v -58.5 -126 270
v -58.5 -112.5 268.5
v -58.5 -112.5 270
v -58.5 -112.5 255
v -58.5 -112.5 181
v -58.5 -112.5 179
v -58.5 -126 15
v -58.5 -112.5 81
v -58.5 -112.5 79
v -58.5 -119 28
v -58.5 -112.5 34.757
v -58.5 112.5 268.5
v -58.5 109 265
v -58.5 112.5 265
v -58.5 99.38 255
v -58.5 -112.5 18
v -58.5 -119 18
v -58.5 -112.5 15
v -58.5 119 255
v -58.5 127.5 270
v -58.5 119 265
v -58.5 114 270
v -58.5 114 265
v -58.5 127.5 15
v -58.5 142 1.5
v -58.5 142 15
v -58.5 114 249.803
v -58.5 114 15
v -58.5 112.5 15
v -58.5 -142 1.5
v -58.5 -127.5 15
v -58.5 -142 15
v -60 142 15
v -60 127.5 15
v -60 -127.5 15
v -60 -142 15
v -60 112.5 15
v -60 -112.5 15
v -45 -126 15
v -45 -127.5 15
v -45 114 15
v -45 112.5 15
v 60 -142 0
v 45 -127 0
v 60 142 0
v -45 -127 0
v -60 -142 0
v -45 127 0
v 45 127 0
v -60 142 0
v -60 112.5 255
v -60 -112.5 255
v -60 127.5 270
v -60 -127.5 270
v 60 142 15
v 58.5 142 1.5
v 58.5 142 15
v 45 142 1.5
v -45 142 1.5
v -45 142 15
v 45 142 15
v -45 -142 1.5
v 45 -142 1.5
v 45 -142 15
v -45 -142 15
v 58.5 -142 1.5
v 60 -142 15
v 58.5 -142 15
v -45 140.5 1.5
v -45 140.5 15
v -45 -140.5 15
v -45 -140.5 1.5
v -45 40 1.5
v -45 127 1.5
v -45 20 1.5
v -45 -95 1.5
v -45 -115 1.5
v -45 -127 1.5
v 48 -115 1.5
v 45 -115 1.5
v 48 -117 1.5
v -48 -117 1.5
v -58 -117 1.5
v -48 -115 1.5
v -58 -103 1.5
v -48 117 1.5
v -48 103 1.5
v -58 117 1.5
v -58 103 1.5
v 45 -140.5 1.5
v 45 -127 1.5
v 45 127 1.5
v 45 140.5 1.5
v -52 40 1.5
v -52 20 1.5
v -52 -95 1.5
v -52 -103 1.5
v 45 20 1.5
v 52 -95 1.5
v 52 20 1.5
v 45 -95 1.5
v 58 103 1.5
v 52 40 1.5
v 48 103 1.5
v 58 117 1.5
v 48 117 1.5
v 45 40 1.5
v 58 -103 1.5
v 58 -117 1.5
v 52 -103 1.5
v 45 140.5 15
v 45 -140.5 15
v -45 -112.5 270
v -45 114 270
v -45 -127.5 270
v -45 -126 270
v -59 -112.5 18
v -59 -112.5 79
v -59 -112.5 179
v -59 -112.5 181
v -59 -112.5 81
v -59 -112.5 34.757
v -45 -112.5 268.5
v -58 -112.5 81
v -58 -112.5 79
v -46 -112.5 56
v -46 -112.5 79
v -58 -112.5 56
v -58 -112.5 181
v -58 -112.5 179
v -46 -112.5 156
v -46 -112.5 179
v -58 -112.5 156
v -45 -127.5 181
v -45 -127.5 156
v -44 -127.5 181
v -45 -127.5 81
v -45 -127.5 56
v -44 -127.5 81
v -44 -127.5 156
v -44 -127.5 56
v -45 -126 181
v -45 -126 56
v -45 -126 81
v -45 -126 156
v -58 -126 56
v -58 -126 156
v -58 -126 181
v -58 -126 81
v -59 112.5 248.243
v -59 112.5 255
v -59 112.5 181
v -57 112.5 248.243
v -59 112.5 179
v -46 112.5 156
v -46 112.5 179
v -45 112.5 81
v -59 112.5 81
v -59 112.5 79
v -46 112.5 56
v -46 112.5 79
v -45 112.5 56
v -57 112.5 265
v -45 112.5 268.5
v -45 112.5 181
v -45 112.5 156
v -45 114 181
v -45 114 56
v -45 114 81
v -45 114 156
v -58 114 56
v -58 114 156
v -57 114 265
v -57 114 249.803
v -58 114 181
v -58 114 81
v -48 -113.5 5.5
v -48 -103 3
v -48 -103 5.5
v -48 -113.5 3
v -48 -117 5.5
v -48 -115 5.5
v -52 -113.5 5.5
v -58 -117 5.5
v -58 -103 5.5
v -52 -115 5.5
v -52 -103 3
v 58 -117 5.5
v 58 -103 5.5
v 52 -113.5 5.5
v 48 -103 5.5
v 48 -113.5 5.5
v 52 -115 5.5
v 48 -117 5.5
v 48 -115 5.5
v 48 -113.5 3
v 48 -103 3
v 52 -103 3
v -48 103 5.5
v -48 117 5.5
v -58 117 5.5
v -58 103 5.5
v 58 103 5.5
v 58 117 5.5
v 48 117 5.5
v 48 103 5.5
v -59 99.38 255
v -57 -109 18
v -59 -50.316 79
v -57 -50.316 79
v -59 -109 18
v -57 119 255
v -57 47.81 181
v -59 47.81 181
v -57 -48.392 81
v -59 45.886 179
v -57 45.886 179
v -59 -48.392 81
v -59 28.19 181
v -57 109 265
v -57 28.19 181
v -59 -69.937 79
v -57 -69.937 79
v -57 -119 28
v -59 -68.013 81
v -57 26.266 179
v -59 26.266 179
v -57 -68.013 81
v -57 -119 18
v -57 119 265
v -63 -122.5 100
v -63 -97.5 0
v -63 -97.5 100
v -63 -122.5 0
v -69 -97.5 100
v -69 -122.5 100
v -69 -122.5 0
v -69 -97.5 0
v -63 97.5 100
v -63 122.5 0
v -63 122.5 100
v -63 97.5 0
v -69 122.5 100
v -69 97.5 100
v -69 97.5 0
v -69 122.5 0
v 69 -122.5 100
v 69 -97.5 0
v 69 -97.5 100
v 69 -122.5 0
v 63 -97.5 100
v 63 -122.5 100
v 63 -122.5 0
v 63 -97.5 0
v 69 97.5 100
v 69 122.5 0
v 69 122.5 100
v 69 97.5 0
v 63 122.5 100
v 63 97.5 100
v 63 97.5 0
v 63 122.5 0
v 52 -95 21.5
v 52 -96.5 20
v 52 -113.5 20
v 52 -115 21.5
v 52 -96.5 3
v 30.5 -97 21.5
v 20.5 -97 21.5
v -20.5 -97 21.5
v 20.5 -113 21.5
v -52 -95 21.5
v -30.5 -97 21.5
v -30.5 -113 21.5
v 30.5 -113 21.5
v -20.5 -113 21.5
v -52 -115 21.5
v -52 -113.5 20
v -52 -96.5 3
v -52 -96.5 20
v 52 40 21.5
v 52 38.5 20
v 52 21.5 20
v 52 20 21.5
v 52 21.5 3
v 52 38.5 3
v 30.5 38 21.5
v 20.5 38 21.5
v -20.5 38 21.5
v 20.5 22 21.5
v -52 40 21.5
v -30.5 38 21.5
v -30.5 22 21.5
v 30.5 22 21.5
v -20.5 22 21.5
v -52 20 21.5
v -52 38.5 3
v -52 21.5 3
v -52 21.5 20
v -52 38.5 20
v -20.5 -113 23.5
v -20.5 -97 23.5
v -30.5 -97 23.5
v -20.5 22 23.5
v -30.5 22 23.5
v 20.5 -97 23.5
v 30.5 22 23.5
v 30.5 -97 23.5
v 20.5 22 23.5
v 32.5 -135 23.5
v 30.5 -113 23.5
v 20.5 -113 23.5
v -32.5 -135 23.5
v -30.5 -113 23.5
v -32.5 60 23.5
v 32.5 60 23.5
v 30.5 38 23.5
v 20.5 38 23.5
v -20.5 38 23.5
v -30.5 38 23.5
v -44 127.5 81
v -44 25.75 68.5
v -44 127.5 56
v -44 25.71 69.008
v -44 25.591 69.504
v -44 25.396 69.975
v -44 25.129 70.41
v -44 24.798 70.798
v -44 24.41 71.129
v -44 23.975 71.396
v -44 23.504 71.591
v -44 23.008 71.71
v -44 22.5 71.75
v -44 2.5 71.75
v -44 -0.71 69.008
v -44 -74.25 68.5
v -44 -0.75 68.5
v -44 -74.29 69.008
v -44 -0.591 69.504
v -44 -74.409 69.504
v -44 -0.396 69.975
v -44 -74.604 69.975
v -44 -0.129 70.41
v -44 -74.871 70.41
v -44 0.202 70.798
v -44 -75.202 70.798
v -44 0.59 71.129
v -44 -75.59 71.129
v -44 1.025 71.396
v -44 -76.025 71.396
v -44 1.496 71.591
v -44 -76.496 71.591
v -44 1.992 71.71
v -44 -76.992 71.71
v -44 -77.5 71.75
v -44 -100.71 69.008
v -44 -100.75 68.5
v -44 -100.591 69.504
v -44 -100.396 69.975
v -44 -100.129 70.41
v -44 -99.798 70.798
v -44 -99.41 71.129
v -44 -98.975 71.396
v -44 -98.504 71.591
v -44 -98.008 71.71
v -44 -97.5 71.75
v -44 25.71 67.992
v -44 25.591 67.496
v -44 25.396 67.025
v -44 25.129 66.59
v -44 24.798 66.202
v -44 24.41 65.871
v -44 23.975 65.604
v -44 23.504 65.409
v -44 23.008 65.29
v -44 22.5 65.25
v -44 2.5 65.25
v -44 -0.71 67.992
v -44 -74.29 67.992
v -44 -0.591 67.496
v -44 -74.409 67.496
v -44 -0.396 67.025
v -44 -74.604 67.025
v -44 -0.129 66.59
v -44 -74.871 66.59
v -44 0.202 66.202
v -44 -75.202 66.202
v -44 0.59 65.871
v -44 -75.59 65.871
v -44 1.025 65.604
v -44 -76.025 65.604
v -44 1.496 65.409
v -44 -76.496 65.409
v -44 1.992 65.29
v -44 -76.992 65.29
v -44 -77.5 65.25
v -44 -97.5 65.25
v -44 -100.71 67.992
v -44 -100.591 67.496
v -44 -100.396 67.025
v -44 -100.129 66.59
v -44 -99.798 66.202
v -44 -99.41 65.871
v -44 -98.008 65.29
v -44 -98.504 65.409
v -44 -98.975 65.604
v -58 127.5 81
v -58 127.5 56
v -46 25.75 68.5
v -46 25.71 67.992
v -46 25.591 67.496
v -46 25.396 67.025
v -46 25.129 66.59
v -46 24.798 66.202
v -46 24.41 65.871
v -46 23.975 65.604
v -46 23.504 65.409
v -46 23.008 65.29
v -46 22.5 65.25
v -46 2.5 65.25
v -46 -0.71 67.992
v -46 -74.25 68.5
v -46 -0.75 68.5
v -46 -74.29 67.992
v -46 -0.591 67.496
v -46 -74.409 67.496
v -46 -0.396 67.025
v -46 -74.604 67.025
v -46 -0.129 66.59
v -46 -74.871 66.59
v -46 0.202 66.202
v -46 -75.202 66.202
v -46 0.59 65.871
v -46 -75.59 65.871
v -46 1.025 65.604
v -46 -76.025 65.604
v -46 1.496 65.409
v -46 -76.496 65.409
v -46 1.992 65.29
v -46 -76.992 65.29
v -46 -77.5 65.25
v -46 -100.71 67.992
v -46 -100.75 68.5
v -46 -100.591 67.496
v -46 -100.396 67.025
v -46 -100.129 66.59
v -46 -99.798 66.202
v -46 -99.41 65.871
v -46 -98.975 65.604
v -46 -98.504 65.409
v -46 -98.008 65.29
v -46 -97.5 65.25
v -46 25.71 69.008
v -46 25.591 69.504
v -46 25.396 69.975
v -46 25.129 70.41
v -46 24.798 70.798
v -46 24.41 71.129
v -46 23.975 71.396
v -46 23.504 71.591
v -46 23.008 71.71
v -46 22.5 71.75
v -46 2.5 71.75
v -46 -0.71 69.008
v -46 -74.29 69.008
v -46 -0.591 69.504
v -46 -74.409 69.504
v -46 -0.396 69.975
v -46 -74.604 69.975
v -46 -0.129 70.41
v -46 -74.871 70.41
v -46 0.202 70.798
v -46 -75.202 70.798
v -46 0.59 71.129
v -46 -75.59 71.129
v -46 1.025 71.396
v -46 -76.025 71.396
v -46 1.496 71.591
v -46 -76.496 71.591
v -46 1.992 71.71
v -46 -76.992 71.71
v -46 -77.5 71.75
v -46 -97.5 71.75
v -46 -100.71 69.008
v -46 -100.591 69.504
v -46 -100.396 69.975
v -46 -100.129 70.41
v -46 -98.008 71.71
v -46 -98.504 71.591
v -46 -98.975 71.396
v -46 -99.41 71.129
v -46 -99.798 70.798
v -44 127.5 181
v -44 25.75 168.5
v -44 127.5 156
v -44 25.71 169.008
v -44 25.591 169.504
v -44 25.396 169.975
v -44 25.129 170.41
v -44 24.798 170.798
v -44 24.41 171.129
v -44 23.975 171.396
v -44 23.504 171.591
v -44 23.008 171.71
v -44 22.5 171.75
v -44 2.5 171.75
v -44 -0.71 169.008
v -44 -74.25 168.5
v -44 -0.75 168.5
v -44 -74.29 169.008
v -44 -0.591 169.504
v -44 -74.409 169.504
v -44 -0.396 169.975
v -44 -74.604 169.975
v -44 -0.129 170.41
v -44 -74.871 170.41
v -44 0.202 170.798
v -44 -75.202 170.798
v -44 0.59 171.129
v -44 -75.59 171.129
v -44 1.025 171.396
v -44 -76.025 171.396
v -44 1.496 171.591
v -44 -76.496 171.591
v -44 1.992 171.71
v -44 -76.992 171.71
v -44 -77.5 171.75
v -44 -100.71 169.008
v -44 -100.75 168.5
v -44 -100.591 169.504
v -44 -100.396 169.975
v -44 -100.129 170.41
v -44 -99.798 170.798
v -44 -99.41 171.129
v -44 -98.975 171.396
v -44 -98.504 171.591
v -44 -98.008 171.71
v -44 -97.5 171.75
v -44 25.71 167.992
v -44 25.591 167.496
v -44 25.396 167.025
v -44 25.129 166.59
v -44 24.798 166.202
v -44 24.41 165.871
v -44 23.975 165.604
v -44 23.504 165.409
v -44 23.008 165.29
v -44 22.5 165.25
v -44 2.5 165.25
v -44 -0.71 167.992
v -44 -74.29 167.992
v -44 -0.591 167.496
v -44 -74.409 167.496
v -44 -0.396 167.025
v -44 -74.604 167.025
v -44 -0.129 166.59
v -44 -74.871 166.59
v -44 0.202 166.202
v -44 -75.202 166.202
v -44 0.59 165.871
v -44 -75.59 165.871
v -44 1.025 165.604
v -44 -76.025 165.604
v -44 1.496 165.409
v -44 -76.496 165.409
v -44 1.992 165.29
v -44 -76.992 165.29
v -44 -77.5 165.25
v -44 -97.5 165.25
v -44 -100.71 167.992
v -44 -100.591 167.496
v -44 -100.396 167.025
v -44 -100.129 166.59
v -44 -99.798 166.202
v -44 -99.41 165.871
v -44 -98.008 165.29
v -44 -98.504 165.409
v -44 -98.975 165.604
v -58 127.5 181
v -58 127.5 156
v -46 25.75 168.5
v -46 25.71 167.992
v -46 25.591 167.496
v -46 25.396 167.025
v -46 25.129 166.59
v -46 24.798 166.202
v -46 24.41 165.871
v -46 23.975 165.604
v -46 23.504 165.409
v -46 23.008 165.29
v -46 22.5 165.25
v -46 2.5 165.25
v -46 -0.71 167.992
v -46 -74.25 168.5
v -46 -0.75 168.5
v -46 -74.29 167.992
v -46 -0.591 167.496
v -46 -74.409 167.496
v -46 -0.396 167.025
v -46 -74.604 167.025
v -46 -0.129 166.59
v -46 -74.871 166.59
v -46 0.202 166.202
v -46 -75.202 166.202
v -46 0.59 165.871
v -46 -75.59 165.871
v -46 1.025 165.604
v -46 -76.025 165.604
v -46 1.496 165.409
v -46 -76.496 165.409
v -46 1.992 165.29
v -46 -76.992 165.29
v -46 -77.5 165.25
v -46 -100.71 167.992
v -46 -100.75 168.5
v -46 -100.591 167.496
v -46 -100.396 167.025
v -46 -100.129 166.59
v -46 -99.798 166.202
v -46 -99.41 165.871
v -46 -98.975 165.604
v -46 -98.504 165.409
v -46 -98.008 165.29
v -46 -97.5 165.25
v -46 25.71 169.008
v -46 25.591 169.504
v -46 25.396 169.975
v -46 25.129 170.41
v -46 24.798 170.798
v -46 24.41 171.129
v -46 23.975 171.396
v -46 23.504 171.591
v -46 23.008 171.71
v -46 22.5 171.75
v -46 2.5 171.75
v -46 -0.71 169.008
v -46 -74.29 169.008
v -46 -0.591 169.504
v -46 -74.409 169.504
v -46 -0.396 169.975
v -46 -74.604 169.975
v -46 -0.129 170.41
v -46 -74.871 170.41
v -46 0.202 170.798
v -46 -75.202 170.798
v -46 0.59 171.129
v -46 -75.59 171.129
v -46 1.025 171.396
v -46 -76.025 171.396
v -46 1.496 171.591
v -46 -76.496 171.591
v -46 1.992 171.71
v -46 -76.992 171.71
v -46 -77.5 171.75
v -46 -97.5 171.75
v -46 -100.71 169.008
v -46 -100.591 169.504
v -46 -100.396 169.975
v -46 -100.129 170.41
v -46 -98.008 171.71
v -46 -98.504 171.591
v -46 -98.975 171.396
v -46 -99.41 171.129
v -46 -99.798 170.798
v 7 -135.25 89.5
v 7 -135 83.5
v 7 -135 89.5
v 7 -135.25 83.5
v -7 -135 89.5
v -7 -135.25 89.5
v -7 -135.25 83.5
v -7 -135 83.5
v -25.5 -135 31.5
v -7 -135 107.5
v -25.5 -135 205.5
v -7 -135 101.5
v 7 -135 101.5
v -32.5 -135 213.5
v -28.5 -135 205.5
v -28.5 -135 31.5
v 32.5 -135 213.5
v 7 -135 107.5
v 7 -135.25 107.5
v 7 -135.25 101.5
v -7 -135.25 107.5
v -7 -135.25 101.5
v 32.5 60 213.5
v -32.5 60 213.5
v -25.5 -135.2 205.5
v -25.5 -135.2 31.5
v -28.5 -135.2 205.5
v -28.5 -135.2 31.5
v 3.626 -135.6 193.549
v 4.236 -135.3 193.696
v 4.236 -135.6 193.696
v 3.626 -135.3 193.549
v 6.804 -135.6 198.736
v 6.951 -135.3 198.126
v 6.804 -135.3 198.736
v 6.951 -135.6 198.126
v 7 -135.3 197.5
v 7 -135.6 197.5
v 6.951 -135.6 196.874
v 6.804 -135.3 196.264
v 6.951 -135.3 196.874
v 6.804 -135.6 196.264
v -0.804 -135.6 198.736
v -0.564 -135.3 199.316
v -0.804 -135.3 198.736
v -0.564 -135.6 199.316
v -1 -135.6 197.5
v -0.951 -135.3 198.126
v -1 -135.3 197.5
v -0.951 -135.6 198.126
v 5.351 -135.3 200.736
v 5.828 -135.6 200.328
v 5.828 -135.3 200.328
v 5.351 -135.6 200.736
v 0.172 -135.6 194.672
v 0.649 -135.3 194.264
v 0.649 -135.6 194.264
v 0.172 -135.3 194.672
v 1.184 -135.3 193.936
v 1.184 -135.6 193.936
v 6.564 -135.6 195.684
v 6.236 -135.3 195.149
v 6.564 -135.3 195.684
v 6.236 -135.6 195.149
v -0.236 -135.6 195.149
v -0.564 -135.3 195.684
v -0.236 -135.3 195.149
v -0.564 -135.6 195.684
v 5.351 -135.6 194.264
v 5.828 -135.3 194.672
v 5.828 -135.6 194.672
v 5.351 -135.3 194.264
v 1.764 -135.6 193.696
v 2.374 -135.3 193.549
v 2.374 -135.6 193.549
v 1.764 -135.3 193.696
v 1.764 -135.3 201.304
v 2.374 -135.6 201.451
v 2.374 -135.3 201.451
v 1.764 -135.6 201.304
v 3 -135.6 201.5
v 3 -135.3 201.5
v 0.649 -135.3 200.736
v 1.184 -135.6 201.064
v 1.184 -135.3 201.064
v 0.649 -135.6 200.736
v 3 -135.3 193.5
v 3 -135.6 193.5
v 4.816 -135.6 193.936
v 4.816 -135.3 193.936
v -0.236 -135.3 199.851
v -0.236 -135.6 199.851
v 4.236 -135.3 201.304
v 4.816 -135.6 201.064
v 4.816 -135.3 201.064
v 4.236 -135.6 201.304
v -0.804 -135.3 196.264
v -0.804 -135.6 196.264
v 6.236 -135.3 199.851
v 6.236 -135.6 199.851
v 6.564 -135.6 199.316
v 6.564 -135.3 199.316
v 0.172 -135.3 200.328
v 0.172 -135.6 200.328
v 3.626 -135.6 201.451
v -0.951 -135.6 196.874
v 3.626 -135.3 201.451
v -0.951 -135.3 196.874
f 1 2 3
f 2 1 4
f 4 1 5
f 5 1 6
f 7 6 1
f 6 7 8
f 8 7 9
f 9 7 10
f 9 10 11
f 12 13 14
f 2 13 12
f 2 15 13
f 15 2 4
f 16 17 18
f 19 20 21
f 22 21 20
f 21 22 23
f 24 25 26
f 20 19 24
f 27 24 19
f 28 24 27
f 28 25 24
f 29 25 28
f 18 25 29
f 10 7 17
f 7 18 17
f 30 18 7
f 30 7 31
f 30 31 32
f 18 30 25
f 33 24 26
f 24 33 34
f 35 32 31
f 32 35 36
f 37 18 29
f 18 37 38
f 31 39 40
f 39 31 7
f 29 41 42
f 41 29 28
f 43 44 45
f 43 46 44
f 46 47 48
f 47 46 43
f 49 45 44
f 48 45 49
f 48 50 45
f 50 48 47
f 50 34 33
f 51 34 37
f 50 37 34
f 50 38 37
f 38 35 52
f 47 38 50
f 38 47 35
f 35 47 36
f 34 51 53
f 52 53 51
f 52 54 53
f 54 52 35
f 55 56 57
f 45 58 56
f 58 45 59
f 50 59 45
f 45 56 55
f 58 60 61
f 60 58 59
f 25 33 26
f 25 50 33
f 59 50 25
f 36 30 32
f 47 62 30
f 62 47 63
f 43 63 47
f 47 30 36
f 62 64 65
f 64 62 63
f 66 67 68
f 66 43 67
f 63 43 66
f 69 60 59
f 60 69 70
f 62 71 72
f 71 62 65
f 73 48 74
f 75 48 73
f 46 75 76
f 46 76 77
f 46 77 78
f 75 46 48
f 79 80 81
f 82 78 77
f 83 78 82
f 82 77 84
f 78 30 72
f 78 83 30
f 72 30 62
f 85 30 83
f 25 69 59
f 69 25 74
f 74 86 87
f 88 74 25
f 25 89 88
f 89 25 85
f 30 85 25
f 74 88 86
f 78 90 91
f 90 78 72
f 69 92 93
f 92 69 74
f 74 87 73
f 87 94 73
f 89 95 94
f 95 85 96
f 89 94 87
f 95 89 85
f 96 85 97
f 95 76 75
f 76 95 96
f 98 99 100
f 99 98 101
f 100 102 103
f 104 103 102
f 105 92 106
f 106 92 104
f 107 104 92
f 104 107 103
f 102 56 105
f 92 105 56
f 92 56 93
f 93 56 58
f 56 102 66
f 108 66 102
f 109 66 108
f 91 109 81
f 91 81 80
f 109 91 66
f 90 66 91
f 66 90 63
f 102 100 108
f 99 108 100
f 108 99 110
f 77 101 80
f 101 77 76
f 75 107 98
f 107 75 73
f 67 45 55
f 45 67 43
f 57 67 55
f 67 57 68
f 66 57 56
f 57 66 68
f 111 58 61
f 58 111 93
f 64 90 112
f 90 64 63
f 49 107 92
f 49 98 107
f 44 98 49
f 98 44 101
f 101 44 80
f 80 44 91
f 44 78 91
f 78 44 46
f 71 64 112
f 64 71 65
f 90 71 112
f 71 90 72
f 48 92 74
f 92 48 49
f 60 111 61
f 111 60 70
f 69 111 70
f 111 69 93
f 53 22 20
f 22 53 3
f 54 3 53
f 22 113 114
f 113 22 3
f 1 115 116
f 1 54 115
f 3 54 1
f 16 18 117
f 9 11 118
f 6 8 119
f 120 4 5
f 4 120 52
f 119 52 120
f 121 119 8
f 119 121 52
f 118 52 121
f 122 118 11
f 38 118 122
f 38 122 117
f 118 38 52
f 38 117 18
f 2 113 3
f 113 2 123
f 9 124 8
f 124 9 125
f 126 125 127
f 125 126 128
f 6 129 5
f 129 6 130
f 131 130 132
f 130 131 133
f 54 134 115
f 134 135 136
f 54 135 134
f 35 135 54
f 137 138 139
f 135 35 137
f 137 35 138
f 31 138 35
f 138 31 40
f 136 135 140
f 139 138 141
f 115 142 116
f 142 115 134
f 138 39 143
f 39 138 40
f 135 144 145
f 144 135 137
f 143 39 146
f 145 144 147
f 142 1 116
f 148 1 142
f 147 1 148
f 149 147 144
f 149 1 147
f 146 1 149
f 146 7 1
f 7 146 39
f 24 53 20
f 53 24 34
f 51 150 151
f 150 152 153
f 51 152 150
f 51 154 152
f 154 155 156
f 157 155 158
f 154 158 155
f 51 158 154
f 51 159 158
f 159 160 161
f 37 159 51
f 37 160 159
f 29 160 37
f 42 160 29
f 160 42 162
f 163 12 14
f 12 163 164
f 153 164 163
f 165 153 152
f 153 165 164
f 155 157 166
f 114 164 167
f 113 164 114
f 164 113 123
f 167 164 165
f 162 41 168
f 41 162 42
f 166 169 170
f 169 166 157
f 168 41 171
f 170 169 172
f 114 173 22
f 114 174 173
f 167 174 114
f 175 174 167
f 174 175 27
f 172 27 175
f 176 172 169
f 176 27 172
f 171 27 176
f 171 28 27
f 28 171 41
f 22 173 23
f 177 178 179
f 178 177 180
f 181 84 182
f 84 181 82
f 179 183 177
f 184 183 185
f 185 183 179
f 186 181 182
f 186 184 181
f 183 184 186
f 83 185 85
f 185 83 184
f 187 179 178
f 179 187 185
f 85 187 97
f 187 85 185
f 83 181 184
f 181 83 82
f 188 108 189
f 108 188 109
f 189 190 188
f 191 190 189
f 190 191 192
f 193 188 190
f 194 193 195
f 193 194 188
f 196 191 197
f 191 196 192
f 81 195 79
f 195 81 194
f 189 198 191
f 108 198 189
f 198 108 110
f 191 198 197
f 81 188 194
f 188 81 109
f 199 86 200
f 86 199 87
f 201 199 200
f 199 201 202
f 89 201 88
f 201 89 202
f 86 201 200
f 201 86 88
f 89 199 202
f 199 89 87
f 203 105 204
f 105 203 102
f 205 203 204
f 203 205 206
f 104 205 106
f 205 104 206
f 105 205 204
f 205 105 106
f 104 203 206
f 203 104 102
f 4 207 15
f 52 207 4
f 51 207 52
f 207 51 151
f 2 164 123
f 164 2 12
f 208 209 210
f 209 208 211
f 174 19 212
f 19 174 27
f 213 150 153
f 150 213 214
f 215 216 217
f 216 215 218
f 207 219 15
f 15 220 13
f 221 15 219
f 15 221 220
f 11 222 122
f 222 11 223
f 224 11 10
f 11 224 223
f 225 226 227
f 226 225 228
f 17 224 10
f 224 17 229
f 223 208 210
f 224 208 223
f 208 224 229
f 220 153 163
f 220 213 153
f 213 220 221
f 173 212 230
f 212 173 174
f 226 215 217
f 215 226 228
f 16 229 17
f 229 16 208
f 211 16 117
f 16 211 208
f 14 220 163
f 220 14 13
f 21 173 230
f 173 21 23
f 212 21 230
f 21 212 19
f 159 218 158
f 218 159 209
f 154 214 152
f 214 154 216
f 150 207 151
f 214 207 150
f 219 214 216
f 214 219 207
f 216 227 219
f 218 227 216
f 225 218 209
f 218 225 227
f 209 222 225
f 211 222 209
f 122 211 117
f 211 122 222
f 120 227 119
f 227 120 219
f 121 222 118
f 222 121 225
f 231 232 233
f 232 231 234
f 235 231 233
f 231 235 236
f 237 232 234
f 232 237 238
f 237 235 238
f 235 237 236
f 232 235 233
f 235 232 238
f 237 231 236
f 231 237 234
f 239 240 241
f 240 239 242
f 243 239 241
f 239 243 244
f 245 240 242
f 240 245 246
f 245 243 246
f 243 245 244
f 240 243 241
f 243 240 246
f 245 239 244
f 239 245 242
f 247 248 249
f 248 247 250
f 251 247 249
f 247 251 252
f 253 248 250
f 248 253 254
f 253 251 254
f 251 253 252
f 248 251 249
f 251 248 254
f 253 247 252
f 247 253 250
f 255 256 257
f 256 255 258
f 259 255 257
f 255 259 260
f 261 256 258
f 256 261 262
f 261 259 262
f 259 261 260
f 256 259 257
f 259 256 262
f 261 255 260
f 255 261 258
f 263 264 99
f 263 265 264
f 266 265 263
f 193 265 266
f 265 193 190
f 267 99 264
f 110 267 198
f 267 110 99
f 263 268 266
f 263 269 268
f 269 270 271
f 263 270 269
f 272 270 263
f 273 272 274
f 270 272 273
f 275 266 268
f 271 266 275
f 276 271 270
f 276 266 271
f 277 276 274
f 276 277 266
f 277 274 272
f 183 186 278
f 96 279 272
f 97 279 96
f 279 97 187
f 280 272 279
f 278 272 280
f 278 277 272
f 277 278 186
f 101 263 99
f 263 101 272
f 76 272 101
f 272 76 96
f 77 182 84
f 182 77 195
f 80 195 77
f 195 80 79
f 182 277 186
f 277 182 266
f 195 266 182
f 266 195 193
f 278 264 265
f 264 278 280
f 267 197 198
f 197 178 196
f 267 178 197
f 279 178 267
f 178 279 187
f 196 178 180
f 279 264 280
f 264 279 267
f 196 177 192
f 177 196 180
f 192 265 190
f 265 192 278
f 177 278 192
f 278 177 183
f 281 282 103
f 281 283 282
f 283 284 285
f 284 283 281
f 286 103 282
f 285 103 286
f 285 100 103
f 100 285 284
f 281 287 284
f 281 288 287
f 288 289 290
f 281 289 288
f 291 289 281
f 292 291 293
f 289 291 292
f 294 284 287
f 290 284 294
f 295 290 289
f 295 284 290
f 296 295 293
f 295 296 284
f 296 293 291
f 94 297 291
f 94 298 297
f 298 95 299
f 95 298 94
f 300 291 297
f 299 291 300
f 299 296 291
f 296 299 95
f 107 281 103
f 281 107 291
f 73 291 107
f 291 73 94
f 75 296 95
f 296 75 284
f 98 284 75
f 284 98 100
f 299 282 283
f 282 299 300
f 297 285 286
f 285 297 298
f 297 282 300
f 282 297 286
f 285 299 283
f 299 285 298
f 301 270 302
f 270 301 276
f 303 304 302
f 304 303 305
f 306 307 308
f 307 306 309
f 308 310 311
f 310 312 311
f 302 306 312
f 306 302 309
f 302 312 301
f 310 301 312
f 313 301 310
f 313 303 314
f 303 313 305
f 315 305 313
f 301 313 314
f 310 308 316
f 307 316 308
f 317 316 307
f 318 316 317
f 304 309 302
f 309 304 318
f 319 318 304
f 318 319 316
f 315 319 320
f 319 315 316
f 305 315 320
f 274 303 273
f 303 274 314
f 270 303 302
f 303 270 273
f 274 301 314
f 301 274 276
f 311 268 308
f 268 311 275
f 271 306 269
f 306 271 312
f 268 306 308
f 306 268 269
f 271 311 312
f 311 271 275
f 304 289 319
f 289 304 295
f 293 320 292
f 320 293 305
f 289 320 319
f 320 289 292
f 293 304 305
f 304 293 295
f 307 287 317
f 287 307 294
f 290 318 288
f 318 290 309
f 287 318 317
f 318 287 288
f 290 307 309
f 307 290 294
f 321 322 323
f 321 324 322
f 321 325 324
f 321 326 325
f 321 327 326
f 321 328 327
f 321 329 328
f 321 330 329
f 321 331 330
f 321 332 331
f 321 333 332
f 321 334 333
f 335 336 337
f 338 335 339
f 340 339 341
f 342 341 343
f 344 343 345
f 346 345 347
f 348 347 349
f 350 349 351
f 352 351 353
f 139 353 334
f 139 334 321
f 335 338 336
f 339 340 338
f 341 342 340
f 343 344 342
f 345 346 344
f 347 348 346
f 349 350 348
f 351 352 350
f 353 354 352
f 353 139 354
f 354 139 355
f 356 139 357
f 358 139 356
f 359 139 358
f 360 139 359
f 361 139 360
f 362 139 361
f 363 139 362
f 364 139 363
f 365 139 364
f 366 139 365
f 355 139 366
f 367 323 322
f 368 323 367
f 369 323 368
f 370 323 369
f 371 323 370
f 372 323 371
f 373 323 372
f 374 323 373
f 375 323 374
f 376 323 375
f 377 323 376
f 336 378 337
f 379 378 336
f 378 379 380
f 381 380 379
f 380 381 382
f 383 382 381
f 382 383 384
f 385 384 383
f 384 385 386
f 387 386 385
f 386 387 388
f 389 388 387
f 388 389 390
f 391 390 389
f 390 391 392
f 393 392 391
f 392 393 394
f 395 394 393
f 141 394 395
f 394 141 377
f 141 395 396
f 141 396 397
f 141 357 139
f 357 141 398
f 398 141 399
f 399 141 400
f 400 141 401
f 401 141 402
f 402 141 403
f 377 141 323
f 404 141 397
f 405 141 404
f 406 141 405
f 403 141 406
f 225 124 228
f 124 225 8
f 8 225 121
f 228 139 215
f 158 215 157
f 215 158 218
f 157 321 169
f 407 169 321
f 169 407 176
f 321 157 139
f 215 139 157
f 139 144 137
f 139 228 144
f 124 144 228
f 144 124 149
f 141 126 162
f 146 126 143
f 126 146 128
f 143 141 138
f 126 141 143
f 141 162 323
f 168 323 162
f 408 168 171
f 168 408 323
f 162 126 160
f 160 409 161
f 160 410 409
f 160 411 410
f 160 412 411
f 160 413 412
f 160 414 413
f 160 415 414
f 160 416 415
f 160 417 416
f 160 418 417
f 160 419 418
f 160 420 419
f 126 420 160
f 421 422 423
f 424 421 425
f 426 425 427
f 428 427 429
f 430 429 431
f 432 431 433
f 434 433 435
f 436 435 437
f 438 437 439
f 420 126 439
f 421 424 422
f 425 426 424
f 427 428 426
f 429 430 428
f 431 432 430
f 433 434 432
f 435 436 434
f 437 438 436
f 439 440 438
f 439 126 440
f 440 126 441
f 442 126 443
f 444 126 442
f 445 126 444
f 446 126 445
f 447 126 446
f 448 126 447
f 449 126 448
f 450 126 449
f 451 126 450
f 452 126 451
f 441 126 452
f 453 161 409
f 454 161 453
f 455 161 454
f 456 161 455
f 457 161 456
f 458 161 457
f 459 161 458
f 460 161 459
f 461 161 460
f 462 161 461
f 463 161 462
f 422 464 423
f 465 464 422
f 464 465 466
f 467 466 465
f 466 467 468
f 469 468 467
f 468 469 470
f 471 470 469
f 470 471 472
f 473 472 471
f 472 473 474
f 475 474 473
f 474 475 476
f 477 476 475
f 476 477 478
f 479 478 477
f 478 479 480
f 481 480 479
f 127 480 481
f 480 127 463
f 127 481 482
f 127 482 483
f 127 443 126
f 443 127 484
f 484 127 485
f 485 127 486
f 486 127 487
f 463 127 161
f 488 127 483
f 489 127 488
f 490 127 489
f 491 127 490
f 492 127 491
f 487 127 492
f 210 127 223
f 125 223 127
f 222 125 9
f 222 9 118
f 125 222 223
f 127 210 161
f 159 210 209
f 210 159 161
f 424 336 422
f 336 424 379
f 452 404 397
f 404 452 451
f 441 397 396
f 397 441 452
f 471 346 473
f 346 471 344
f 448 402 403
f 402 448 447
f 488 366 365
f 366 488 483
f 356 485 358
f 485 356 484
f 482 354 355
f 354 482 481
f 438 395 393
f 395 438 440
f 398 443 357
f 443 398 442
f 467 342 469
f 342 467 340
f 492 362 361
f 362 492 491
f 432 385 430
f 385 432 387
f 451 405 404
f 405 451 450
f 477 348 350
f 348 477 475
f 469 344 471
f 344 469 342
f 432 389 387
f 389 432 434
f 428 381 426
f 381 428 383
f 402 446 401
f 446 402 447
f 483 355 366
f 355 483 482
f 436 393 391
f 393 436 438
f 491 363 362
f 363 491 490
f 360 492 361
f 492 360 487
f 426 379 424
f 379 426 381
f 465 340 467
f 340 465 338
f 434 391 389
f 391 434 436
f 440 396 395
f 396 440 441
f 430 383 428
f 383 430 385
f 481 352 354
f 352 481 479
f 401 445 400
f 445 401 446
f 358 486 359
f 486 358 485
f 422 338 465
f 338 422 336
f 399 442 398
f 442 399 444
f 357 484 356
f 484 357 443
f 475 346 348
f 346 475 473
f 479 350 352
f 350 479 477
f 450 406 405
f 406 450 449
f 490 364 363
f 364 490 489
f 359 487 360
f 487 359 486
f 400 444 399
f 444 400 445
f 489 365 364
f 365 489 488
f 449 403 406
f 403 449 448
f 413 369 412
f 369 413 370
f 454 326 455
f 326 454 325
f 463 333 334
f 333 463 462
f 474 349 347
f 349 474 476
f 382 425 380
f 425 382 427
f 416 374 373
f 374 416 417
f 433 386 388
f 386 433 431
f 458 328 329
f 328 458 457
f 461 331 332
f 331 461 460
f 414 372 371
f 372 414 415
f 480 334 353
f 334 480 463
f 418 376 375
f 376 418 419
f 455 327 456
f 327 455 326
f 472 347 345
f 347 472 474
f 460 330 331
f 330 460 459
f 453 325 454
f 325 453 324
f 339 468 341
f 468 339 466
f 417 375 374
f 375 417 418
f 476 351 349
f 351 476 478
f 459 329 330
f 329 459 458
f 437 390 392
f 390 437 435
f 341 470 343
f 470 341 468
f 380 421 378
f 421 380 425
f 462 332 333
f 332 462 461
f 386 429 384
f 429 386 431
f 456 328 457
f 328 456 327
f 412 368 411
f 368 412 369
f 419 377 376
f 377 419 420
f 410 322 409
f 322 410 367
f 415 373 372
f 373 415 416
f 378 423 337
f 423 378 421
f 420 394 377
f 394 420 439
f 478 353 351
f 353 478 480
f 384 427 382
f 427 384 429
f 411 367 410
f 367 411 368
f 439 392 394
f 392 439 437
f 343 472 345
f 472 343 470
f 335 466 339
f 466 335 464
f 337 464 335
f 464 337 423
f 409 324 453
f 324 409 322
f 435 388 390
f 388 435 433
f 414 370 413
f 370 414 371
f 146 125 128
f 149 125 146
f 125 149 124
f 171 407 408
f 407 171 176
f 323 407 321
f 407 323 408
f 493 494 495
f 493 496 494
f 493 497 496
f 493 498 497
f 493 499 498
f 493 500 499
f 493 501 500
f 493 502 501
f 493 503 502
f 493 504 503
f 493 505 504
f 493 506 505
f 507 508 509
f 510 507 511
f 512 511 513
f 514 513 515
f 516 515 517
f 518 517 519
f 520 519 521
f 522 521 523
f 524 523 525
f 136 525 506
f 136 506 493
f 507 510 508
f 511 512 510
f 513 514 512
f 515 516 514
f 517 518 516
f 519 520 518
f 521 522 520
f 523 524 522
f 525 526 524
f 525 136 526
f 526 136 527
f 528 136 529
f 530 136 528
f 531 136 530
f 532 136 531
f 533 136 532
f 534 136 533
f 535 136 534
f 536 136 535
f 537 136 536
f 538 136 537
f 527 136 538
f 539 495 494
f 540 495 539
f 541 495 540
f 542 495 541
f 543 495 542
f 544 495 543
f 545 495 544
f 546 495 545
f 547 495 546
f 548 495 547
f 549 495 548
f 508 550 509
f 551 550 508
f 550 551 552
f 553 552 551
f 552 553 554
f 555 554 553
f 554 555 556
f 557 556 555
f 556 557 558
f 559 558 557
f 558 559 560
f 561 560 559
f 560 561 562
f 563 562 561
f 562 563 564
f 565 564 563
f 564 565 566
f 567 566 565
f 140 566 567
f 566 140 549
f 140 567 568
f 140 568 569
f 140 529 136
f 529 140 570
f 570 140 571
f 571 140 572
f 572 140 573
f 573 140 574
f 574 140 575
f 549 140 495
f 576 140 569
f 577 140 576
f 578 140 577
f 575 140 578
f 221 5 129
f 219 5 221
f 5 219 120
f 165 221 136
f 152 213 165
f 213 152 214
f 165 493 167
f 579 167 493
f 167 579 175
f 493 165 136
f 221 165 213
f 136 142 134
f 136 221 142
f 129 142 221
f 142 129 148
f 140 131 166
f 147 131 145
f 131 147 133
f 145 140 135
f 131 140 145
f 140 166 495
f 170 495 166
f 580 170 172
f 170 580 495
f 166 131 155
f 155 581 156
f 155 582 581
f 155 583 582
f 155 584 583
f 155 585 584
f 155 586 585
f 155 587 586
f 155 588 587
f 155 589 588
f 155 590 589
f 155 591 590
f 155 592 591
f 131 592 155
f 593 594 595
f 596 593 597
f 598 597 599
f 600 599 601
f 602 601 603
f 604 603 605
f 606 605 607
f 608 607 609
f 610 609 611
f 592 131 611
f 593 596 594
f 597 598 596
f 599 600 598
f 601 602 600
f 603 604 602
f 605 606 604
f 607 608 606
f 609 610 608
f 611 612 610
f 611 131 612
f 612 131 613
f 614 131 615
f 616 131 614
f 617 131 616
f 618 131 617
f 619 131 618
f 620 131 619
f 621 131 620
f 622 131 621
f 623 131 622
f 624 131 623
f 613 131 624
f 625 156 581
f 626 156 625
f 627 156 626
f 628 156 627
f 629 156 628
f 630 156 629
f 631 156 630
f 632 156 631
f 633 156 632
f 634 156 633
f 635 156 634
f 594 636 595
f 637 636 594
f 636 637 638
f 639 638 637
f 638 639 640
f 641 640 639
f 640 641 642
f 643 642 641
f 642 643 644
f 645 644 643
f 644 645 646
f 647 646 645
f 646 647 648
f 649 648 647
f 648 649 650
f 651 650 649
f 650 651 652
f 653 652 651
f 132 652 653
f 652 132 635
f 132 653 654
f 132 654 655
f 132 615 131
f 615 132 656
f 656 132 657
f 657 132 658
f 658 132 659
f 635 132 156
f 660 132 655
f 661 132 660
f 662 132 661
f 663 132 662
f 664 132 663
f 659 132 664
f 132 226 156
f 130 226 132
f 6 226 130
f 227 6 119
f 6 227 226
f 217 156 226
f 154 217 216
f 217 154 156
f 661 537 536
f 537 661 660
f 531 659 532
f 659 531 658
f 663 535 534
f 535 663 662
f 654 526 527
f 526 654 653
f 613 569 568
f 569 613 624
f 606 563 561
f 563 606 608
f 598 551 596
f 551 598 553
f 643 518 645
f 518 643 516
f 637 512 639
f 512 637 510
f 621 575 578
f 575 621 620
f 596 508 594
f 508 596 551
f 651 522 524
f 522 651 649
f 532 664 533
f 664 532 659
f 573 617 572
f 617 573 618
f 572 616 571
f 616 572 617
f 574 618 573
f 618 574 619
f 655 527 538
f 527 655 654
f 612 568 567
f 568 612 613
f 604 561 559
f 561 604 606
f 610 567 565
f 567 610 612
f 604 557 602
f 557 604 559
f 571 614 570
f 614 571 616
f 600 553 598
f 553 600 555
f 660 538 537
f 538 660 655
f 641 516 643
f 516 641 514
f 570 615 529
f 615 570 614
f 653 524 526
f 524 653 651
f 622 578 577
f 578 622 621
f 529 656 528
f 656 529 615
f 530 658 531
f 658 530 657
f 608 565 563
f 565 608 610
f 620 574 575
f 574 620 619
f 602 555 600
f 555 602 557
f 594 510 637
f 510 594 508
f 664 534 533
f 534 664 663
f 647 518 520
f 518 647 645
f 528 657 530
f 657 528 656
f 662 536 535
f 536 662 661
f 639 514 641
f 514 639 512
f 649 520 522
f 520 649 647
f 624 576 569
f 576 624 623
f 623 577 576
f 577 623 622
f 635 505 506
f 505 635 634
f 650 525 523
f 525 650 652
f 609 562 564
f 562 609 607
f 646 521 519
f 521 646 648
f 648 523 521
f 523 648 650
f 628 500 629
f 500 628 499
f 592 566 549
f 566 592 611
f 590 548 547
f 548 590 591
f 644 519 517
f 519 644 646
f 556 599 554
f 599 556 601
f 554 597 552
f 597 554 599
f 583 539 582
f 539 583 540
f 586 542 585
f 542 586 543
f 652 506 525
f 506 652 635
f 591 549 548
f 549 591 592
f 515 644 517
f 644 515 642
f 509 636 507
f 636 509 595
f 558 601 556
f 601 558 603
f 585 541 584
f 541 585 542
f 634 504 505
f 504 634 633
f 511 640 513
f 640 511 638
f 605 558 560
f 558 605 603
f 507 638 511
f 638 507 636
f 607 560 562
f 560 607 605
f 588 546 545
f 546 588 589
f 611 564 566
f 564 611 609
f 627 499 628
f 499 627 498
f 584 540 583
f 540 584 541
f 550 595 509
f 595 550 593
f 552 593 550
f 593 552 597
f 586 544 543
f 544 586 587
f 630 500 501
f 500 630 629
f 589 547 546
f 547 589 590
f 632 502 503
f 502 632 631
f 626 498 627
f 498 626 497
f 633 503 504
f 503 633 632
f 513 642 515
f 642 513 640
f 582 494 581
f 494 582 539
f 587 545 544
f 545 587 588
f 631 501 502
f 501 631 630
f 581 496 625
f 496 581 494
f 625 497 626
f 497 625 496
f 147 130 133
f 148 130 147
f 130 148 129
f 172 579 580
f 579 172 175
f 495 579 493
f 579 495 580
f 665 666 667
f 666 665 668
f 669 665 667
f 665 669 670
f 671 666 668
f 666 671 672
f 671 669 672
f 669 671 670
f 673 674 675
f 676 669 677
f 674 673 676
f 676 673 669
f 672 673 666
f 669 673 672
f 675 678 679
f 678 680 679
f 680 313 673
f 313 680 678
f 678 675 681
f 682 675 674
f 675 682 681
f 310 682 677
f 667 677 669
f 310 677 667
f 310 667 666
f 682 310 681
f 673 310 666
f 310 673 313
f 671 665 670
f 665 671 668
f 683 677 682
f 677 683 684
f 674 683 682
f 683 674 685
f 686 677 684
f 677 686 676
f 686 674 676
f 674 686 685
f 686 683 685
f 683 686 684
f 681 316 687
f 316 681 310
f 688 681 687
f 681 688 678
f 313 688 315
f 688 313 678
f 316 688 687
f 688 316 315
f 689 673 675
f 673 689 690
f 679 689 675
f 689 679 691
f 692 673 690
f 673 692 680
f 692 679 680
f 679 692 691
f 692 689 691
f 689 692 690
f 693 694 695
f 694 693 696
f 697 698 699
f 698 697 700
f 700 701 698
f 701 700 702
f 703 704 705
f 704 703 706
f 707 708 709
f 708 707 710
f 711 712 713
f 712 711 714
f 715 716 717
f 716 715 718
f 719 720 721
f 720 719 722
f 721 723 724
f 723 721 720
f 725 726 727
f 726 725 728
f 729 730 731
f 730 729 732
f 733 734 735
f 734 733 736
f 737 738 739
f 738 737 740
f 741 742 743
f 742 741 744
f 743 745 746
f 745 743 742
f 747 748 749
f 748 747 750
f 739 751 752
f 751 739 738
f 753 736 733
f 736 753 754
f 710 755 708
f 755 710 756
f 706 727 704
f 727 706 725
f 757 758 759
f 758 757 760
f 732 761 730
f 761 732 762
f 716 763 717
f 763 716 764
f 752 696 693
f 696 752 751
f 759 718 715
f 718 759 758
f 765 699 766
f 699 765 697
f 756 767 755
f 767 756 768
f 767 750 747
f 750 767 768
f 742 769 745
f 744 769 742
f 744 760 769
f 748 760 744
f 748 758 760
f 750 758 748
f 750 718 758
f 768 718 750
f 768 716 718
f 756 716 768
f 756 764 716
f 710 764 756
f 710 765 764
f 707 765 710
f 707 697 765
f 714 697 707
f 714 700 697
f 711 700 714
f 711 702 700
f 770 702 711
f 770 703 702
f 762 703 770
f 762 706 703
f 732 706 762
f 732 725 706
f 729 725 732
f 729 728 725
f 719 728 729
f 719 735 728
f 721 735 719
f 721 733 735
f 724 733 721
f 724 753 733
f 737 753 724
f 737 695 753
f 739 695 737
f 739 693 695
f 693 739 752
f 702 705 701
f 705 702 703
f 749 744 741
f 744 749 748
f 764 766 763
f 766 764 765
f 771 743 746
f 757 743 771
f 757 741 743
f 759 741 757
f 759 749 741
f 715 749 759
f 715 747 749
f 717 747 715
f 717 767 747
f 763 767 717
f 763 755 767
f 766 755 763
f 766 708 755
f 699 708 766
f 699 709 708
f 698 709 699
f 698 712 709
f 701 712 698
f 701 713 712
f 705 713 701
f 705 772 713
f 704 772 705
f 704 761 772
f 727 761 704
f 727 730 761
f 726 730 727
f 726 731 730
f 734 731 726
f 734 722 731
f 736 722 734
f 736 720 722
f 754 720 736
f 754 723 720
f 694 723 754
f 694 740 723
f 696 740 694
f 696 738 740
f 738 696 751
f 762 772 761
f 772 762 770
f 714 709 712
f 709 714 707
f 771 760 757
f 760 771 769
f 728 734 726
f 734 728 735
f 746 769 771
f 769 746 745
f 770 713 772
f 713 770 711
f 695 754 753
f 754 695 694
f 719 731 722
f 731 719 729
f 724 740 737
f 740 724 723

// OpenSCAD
// file: ../n4.scad
// H7 R8.1 · C120 / n4 P0.1 · mm · concept, not fabrication
// X transverse; Y front(-) rear(+); Z upward; local carrier origin.
// Select: assembly, exploded, dummy, tower, carrier, adapter, front, rear
mode="assembly";
model="dummy"; // dummy, Q510, Q910, Q520, Q920
adapter="saddle"; // saddle or vesa (cover and fasteners not certified)
show_cables=true;
show_guides=true;
show_vent_zones=false; // illustrative worst-case zones, not actual grille map
$fn=32;
W=120; D=284; H=280; pitch=190;
pcw=model=="dummy"?65:(model=="Q510"||model=="Q910"?54:58.7);
pcd=model=="dummy"?195:(model=="Q510"||model=="Q910"?188:191);
pch=model=="dummy"?190:185;
front=-135; back=front+pcd; sole=23.5;
saddle_y=[-105,30]; // movable, change after mapping vents and feet
alu=[.67,.72,.76]; black=[.10,.12,.14]; pad=[.23,.27,.25]; orange=[.91,.48,.16]; blue=[.23,.64,.84];
module b(x,y,z,w,d,h){translate([x,y,z])cube([w,d,h]);}
module tube_x(y,z){difference(){b(-52,y-10,z,104,20,20);b(-53,y-8.5,z+1.5,106,17,17);}}
module lower(){
 color(alu){
 for(s=[-1,1]) {
   x=s<0?-60:58.5;
   b(x,-142,0,1.5,284,15);
   b(s<0?-60:45,-142,0,15,284,1.5);
 }
 for(y=[-142,127]){b(-45,y,0,90,15,1.5); b(-45,y==-142?y:y+13.5,0,90,1.5,15);}
 }
}
module universal(){
 lower();
 color(alu){
 for(y=[-127.5,112.5]){
   b(-60,y,15,1.5,15,255); b(-60,y,15,15,1.5,255);
 }
 b(-60,-112.5,255,1.5,225,15);b(-60,-112.5,268.5,15,225,1.5);
 // diagonal external-plane metal brace, idealised. Joint/fastener details TBD.
 hull(){b(-59,-119,18,2,10,10);b(-59,109,255,2,10,10);}
 // candidate metallic front/rear lifting/retention points below top envelope
 for(y=[-110,110])for(x=[-58,48]) b(x,y-7,1.5,10,14,4);
 }
}
module fixed_guides(){
 color([.35,.41,.46])for(x=[-66,66])for(y=[-110,110])b(x-3,y-12.5,0,6,25,100);
}
module pc(){
 color(black)translate([-pcw/2,front,sole])cube([pcw,pcd,pch]);
 // schematic fascia: front control strip, USB and switch not exact placement
 color([.18,.19,.20])b(-pcw/2,front-.1,sole,pcw,.1,pch);
 color([.65,.05,.08])b(-pcw/2+4,front-.3,sole+8,3,.2,pch-16);
 color([.63,.67,.69])for(z=[sole+60,sole+78])b(-7,front-.35,z,14,.25,6);
 color([.75,.78,.79])translate([4,front-.45,sole+pch-16])rotate([90,0,0])cylinder(h=.3,r=5);
 // logo visual cue on broad face; not exact product CAD
 color([.66,.68,.7])translate([pcw/2+.1,front+pcd/2,sole+pch/2])rotate([90,0,90])linear_extrude(.3)text("FUJITSU",size=8,halign="center",valign="center");
 // Q rear ports illustrative only
 color([.56,.58,.59])for(z=[sole+30,sole+55,sole+95,sole+130])b(-12,back,z,24,.3,10);
}
module saddles(){
 for(y=saddle_y){
  color(alu)tube_x(y,1.5);
  color(pad)for(x=[-pcw/2+2,pcw/2-12])b(x,y-8,21.5,10,16,2);
  // short adjustable side jaws, metal structural body & replaceable pad
  for(s=[-1,1]){
    color(alu)b(s<0?-pcw/2-5:pcw/2+2,y-8,21.5,3,16,14);
    color(pad)b(s<0?-pcw/2-2:pcw/2,y-8,23.5,2,16,12);
  }
 }
 // low axial stops with pad, front/rear bottom corners only; survey before use
 for(y=[front-4,back+2]){
  color(alu)b(-52,y-2,1.5,104,6,20);
  color(alu)b(-20,y,sole-2,40,2,14);
  color(pad)b(-20,y==front-4?y+2:y-2,sole,40,2,10);
 }
 // positive top restraint candidate; adjustable vertical metal posts separate from PC,
 // fingers near non-vented corners only. Keep hands/controls clear.
 for(y=saddle_y){
  color(alu)b(43,y-6,21.5,5,12,pch+5);
  color(alu)b(pcw/2-8,y-6,sole+pch+2,48-(pcw/2-8),12,3);
 }
}
module top_pads(){for(y=saddle_y)color(pad)b(pcw/2-8,y-6,sole+pch,8,12,2);}
module vesa(){
 // Open four-point VESA 100 mockup; no assumption of threads or screw depth.
 // Sides x negative; frame on OEM cover needs physical verification.
 color(orange)for(y=[front+pcd/2-50,front+pcd/2+50])
 for(z=[sole+pch/2-50,sole+pch/2+50])
 translate([-42,y,z])rotate([0,90,0])cylinder(h=4,r=8);
 color(alu)for(z=[sole+pch/2-50,sole+pch/2+50])b(-45,-112.5,z-8,7,225,16);
}
module cables(){
 // reserves, not solid wires or established socket locations
 color([.35,.73,.93,.35])b(-pcw/2-4,back,sole+14,pcw+8,142-back,155);
 color([.12,.15,.17])for(z=[sole+35,sole+65,sole+100,sole+135]) {
   b(-6,back,z,12,30,10);
   hull(){b(-5,back+30,z+2,10,2,6);b(-5,back+58,z-16,10,2,6);}
 }
}
module unit(){
 universal();
 if(show_guides)fixed_guides();
 if(adapter=="saddle"){saddles();top_pads();} else {vesa();for(y=saddle_y){color(alu)tube_x(y,1.5);color(pad)for(x=[-pcw/2+2,pcw/2-12])b(x,y-8,21.5,10,16,2);}}
 pc();
 if(show_cables)cables();
 if(show_vent_zones){
 color([1,.2,.1,.13])b(pcw/2,front,sole,200,pcd,pch);
 color([1,.2,.1,.13])b(-pcw/2-200,front,sole,200,pcd,pch);
 color([1,.2,.1,.13])b(-pcw/2,back,sole,pcw,200,pch);
 color([1,.2,.1,.13])b(-pcw/2,front,sole+pch,pcw,pcd,200);
 }
}
if(mode=="dummy") cube([65,195,190]);
else if(mode=="collision"){
 intersection(){
   translate([-pcw/2+.05,front+.05,sole+.05])cube([pcw-.1,pcd-.1,pch-.1]);
   union(){universal();fixed_guides();saddles();top_pads();}
 }
}
else if(mode=="carrier")universal();
else if(mode=="pc")pc();
else if(mode=="guides")fixed_guides();
else if(mode=="cables")cables();
else if(mode=="adapter"){saddles();top_pads();}
else if(mode=="exploded"){
 universal();fixed_guides();
 translate([0,0,40]){saddles();top_pads();}
 translate([0,0,105])pc();
}
else if(mode=="tower"){
 // 7 positions, n4 at end of row, remaining guides empty; base studio approximation.
 color([.36,.40,.44]){b(-92.5,-155,-20,1325,20,20); b(-92.5,135,-20,1325,20,20);for(i=[0:6])b(i*pitch-10,-135,-20,20,270,20);}
 unit();
 for(i=[1:6])translate([i*pitch,0,0])fixed_guides();
}
else unit();
// main file
// H7 R8.1 · n4 / U-Fujitsu P0.2 · parametrico, NO-GO fabbricazione
// Conserva C120 P0.1; solo adattatori ridisegnati.
use <../n4.scad>
mode="assembly";  // assembly, A, B, A_metal, B_metal, collision, fit_A
model="dummy"; // Q510,Q910,Q520,Q920,dummy
variant="A";  // VESA OEM (A) oppure selle + ritenute (B)
show_fixed=true;
show_socket_proxy=false;
$fn=40;
pcw=model=="dummy"?65:(model=="Q510"||model=="Q910"?54:58.7);
pcd=model=="dummy"?195:(model=="Q510"||model=="Q910"?188:191);
pch=model=="dummy"?190:185;
front=-135; back=front+pcd; sole=23.5;
saddle_y=[-105,30];
vesa_y=front+pcd/2;  // centro teorico: non è la quota del gancio OEM
vesa_z=sole+pch/2;
vesa_d=6.5; // foro-asola di studio, da sostituire dopo verifica viti OEM
vesa_travel=10;
cover_gap=0; // sporgenza cover reale dal piano nominale macchina (da rilevare)
alu=[.67,.72,.76]; black=[.10,.12,.14]; pad=[.23,.27,.25]; orange=[.91,.48,.16]; blue=[.23,.64,.84];
W=120;D=284;H=280;pitch=190;
module bx(x,y,z,w,d,h){translate([x,y,z])cube([w,d,h]);}
module tube(y){difference(){bx(-52,y-10,1.5,104,20,20);bx(-53,y-8.5,3,106,17,17);}}
module support(pads=true) {
 color(alu)for (y=saddle_y)tube(y);
 if(pads)color(pad)for(y=saddle_y)for(x=[-pcw/2+2,pcw/2-12])bx(x,y-8,21.5,10,16,2);
}
// A: angle rails with open centre and slots along Y, manufacturing details subject to measurement.
// L25×15×2 web plane x=-46..-44, open flanges point away from PC.
module slot_y(y,z){
 hull(){for(dy=[-vesa_travel,vesa_travel])translate([-47,y+dy,z])rotate([0,90,0])cylinder(h=4,d=vesa_d);}
}
module vesa_rail(z){
 color(orange)difference(){
  union(){bx(-46,-112.5,z-12.5,2,225,25);bx(-59,-112.5,z+10.5,13,225,2);}
  for(y=[vesa_y-50,vesa_y+50])slot_y(y,z);
 }
 // Separate end bridges meet rail end; ideal support volume, real joint hardware TBD
 color(alu)for(y=[-127.5,112.5])bx(-58,y,z-12.5,14,15,25);
}
module A(pads=true){
 support(pads);
 for(z=[vesa_z-50,vesa_z+50])vesa_rail(z);
 // Allow OEM cover and standoffs exclusively after actual measurement.
 // Here no invented screw/retaining tab is considered structure.
 if(show_socket_proxy)color([.25,.65,.9,.35])for(y=[vesa_y-50,vesa_y+50])for(z=[vesa_z-50,vesa_z+50])
  bx(-44,y-7,z-7,44-pcw/2-cover_gap,14,14);
}
// B: light metallic angle masts with replaceable fingers and small corner stops.
// no parts through front/control region except candidate 8 mm lower corner contacts.
module B(pads=true){
 support(pads);
 for(y=saddle_y){
  // lower lateral stops, metal + contact pads
  for(s=[-1,1]){
   color(alu)bx(s<0?-pcw/2-5:pcw/2+2,y-8,21.5,3,16,14);
   if(pads)color(pad)bx(s<0?-pcw/2-2:pcw/2,y-8,23.5,2,16,12);
  }
  // B post corrected after bending screen: rectangular closed 12×15×1.5.
  // X43..55, Y±7.5. Tube lower end sits on foot; fastener holes depend on actual stock.
  color(orange)difference(){
    bx(43,y-7.5,21.5,12,15,pch+5);
    bx(44.5,y-6,21,9,12,pch+6);
  }
  color(orange){
    bx(40,y-9.5,21.5,15,19,2);
    // Bent top finger behind mast: 25 mm downturned leg in plane Y.
    bx(43,y-9.5,sole+pch-20,12,2,25);
    bx(pcw/2-8,y-9.5,sole+pch+2,55-(pcw/2-8),15.5,3);
  }
  if(pads)color(pad)bx(pcw/2-8,y-6,sole+pch,8,12,2);
 }
 // transverse light rectangular tube, 10 x 10 x 1.5, two stop pairs.
 // front tube centre -137 within C120. rear centre back+3, below socket zone.
 for(y=[front-2,back+3]){
  // front tube is shifted 0.5 back to stay inside y=-142 and not occupy fascia.
  yy=y==front-2?front-1.5:y;
  color(alu)difference(){bx(-52,yy-5,1.5,104,10,10);bx(-53,yy-3.5,3,106,7,7);}
  for(x=[-pcw/2+2,pcw/2-10]){
   // Metal ears rise from tube along corner of face. Pads touch nominal chassis face.
   yy2=y==front-2?front-4:back+2;
   color(orange)bx(x,yy2,11.5,8,2,22);
   if(pads)color(pad)bx(x,y==front-2?front-2:back,sole,8,2,10);
  }
 }
}
module bare(){translate([-pcw/2,front,sole])cube([pcw,pcd,pch]);}
module dummy_pc(){
 color(black)bare();
 // schematic front facia, no certainty on exact coordinates
 color([.7,.05,.08])bx(-pcw/2+4,front-.2,sole+8,3,.2,pch-16);
 color([.72,.74,.76])translate([3,front-.3,sole+pch-16])rotate([90,0,0])cylinder(h=.3,r=4);
 color([.65,.66,.68])for(z=[sole+60,sole+78])bx(-7,front-.25,z,14,.25,6);
}
module carrier_ref(){
 // exact outer geometry of P0.1, variables supplied by this file
 universal();
 if(show_fixed)fixed_guides();
}
module adapter_selected(pads=true){if(variant=="A")A(pads);else B(pads);}
if(mode=="A")A();
else if(mode=="B")B();
else if(mode=="A_metal")A(false);
else if(mode=="B_metal")B(false);
else if(mode=="collision"){
 intersection(){
  translate([-pcw/2+.05,front+.05,sole+.05])cube([pcw-.1,pcd-.1,pch-.1]);
  union(){carrier_ref();adapter_selected();}
 }
}
else if(mode=="fit_A"){carrier_ref();A();dummy_pc();}
else{carrier_ref();adapter_selected();dummy_pc();}
